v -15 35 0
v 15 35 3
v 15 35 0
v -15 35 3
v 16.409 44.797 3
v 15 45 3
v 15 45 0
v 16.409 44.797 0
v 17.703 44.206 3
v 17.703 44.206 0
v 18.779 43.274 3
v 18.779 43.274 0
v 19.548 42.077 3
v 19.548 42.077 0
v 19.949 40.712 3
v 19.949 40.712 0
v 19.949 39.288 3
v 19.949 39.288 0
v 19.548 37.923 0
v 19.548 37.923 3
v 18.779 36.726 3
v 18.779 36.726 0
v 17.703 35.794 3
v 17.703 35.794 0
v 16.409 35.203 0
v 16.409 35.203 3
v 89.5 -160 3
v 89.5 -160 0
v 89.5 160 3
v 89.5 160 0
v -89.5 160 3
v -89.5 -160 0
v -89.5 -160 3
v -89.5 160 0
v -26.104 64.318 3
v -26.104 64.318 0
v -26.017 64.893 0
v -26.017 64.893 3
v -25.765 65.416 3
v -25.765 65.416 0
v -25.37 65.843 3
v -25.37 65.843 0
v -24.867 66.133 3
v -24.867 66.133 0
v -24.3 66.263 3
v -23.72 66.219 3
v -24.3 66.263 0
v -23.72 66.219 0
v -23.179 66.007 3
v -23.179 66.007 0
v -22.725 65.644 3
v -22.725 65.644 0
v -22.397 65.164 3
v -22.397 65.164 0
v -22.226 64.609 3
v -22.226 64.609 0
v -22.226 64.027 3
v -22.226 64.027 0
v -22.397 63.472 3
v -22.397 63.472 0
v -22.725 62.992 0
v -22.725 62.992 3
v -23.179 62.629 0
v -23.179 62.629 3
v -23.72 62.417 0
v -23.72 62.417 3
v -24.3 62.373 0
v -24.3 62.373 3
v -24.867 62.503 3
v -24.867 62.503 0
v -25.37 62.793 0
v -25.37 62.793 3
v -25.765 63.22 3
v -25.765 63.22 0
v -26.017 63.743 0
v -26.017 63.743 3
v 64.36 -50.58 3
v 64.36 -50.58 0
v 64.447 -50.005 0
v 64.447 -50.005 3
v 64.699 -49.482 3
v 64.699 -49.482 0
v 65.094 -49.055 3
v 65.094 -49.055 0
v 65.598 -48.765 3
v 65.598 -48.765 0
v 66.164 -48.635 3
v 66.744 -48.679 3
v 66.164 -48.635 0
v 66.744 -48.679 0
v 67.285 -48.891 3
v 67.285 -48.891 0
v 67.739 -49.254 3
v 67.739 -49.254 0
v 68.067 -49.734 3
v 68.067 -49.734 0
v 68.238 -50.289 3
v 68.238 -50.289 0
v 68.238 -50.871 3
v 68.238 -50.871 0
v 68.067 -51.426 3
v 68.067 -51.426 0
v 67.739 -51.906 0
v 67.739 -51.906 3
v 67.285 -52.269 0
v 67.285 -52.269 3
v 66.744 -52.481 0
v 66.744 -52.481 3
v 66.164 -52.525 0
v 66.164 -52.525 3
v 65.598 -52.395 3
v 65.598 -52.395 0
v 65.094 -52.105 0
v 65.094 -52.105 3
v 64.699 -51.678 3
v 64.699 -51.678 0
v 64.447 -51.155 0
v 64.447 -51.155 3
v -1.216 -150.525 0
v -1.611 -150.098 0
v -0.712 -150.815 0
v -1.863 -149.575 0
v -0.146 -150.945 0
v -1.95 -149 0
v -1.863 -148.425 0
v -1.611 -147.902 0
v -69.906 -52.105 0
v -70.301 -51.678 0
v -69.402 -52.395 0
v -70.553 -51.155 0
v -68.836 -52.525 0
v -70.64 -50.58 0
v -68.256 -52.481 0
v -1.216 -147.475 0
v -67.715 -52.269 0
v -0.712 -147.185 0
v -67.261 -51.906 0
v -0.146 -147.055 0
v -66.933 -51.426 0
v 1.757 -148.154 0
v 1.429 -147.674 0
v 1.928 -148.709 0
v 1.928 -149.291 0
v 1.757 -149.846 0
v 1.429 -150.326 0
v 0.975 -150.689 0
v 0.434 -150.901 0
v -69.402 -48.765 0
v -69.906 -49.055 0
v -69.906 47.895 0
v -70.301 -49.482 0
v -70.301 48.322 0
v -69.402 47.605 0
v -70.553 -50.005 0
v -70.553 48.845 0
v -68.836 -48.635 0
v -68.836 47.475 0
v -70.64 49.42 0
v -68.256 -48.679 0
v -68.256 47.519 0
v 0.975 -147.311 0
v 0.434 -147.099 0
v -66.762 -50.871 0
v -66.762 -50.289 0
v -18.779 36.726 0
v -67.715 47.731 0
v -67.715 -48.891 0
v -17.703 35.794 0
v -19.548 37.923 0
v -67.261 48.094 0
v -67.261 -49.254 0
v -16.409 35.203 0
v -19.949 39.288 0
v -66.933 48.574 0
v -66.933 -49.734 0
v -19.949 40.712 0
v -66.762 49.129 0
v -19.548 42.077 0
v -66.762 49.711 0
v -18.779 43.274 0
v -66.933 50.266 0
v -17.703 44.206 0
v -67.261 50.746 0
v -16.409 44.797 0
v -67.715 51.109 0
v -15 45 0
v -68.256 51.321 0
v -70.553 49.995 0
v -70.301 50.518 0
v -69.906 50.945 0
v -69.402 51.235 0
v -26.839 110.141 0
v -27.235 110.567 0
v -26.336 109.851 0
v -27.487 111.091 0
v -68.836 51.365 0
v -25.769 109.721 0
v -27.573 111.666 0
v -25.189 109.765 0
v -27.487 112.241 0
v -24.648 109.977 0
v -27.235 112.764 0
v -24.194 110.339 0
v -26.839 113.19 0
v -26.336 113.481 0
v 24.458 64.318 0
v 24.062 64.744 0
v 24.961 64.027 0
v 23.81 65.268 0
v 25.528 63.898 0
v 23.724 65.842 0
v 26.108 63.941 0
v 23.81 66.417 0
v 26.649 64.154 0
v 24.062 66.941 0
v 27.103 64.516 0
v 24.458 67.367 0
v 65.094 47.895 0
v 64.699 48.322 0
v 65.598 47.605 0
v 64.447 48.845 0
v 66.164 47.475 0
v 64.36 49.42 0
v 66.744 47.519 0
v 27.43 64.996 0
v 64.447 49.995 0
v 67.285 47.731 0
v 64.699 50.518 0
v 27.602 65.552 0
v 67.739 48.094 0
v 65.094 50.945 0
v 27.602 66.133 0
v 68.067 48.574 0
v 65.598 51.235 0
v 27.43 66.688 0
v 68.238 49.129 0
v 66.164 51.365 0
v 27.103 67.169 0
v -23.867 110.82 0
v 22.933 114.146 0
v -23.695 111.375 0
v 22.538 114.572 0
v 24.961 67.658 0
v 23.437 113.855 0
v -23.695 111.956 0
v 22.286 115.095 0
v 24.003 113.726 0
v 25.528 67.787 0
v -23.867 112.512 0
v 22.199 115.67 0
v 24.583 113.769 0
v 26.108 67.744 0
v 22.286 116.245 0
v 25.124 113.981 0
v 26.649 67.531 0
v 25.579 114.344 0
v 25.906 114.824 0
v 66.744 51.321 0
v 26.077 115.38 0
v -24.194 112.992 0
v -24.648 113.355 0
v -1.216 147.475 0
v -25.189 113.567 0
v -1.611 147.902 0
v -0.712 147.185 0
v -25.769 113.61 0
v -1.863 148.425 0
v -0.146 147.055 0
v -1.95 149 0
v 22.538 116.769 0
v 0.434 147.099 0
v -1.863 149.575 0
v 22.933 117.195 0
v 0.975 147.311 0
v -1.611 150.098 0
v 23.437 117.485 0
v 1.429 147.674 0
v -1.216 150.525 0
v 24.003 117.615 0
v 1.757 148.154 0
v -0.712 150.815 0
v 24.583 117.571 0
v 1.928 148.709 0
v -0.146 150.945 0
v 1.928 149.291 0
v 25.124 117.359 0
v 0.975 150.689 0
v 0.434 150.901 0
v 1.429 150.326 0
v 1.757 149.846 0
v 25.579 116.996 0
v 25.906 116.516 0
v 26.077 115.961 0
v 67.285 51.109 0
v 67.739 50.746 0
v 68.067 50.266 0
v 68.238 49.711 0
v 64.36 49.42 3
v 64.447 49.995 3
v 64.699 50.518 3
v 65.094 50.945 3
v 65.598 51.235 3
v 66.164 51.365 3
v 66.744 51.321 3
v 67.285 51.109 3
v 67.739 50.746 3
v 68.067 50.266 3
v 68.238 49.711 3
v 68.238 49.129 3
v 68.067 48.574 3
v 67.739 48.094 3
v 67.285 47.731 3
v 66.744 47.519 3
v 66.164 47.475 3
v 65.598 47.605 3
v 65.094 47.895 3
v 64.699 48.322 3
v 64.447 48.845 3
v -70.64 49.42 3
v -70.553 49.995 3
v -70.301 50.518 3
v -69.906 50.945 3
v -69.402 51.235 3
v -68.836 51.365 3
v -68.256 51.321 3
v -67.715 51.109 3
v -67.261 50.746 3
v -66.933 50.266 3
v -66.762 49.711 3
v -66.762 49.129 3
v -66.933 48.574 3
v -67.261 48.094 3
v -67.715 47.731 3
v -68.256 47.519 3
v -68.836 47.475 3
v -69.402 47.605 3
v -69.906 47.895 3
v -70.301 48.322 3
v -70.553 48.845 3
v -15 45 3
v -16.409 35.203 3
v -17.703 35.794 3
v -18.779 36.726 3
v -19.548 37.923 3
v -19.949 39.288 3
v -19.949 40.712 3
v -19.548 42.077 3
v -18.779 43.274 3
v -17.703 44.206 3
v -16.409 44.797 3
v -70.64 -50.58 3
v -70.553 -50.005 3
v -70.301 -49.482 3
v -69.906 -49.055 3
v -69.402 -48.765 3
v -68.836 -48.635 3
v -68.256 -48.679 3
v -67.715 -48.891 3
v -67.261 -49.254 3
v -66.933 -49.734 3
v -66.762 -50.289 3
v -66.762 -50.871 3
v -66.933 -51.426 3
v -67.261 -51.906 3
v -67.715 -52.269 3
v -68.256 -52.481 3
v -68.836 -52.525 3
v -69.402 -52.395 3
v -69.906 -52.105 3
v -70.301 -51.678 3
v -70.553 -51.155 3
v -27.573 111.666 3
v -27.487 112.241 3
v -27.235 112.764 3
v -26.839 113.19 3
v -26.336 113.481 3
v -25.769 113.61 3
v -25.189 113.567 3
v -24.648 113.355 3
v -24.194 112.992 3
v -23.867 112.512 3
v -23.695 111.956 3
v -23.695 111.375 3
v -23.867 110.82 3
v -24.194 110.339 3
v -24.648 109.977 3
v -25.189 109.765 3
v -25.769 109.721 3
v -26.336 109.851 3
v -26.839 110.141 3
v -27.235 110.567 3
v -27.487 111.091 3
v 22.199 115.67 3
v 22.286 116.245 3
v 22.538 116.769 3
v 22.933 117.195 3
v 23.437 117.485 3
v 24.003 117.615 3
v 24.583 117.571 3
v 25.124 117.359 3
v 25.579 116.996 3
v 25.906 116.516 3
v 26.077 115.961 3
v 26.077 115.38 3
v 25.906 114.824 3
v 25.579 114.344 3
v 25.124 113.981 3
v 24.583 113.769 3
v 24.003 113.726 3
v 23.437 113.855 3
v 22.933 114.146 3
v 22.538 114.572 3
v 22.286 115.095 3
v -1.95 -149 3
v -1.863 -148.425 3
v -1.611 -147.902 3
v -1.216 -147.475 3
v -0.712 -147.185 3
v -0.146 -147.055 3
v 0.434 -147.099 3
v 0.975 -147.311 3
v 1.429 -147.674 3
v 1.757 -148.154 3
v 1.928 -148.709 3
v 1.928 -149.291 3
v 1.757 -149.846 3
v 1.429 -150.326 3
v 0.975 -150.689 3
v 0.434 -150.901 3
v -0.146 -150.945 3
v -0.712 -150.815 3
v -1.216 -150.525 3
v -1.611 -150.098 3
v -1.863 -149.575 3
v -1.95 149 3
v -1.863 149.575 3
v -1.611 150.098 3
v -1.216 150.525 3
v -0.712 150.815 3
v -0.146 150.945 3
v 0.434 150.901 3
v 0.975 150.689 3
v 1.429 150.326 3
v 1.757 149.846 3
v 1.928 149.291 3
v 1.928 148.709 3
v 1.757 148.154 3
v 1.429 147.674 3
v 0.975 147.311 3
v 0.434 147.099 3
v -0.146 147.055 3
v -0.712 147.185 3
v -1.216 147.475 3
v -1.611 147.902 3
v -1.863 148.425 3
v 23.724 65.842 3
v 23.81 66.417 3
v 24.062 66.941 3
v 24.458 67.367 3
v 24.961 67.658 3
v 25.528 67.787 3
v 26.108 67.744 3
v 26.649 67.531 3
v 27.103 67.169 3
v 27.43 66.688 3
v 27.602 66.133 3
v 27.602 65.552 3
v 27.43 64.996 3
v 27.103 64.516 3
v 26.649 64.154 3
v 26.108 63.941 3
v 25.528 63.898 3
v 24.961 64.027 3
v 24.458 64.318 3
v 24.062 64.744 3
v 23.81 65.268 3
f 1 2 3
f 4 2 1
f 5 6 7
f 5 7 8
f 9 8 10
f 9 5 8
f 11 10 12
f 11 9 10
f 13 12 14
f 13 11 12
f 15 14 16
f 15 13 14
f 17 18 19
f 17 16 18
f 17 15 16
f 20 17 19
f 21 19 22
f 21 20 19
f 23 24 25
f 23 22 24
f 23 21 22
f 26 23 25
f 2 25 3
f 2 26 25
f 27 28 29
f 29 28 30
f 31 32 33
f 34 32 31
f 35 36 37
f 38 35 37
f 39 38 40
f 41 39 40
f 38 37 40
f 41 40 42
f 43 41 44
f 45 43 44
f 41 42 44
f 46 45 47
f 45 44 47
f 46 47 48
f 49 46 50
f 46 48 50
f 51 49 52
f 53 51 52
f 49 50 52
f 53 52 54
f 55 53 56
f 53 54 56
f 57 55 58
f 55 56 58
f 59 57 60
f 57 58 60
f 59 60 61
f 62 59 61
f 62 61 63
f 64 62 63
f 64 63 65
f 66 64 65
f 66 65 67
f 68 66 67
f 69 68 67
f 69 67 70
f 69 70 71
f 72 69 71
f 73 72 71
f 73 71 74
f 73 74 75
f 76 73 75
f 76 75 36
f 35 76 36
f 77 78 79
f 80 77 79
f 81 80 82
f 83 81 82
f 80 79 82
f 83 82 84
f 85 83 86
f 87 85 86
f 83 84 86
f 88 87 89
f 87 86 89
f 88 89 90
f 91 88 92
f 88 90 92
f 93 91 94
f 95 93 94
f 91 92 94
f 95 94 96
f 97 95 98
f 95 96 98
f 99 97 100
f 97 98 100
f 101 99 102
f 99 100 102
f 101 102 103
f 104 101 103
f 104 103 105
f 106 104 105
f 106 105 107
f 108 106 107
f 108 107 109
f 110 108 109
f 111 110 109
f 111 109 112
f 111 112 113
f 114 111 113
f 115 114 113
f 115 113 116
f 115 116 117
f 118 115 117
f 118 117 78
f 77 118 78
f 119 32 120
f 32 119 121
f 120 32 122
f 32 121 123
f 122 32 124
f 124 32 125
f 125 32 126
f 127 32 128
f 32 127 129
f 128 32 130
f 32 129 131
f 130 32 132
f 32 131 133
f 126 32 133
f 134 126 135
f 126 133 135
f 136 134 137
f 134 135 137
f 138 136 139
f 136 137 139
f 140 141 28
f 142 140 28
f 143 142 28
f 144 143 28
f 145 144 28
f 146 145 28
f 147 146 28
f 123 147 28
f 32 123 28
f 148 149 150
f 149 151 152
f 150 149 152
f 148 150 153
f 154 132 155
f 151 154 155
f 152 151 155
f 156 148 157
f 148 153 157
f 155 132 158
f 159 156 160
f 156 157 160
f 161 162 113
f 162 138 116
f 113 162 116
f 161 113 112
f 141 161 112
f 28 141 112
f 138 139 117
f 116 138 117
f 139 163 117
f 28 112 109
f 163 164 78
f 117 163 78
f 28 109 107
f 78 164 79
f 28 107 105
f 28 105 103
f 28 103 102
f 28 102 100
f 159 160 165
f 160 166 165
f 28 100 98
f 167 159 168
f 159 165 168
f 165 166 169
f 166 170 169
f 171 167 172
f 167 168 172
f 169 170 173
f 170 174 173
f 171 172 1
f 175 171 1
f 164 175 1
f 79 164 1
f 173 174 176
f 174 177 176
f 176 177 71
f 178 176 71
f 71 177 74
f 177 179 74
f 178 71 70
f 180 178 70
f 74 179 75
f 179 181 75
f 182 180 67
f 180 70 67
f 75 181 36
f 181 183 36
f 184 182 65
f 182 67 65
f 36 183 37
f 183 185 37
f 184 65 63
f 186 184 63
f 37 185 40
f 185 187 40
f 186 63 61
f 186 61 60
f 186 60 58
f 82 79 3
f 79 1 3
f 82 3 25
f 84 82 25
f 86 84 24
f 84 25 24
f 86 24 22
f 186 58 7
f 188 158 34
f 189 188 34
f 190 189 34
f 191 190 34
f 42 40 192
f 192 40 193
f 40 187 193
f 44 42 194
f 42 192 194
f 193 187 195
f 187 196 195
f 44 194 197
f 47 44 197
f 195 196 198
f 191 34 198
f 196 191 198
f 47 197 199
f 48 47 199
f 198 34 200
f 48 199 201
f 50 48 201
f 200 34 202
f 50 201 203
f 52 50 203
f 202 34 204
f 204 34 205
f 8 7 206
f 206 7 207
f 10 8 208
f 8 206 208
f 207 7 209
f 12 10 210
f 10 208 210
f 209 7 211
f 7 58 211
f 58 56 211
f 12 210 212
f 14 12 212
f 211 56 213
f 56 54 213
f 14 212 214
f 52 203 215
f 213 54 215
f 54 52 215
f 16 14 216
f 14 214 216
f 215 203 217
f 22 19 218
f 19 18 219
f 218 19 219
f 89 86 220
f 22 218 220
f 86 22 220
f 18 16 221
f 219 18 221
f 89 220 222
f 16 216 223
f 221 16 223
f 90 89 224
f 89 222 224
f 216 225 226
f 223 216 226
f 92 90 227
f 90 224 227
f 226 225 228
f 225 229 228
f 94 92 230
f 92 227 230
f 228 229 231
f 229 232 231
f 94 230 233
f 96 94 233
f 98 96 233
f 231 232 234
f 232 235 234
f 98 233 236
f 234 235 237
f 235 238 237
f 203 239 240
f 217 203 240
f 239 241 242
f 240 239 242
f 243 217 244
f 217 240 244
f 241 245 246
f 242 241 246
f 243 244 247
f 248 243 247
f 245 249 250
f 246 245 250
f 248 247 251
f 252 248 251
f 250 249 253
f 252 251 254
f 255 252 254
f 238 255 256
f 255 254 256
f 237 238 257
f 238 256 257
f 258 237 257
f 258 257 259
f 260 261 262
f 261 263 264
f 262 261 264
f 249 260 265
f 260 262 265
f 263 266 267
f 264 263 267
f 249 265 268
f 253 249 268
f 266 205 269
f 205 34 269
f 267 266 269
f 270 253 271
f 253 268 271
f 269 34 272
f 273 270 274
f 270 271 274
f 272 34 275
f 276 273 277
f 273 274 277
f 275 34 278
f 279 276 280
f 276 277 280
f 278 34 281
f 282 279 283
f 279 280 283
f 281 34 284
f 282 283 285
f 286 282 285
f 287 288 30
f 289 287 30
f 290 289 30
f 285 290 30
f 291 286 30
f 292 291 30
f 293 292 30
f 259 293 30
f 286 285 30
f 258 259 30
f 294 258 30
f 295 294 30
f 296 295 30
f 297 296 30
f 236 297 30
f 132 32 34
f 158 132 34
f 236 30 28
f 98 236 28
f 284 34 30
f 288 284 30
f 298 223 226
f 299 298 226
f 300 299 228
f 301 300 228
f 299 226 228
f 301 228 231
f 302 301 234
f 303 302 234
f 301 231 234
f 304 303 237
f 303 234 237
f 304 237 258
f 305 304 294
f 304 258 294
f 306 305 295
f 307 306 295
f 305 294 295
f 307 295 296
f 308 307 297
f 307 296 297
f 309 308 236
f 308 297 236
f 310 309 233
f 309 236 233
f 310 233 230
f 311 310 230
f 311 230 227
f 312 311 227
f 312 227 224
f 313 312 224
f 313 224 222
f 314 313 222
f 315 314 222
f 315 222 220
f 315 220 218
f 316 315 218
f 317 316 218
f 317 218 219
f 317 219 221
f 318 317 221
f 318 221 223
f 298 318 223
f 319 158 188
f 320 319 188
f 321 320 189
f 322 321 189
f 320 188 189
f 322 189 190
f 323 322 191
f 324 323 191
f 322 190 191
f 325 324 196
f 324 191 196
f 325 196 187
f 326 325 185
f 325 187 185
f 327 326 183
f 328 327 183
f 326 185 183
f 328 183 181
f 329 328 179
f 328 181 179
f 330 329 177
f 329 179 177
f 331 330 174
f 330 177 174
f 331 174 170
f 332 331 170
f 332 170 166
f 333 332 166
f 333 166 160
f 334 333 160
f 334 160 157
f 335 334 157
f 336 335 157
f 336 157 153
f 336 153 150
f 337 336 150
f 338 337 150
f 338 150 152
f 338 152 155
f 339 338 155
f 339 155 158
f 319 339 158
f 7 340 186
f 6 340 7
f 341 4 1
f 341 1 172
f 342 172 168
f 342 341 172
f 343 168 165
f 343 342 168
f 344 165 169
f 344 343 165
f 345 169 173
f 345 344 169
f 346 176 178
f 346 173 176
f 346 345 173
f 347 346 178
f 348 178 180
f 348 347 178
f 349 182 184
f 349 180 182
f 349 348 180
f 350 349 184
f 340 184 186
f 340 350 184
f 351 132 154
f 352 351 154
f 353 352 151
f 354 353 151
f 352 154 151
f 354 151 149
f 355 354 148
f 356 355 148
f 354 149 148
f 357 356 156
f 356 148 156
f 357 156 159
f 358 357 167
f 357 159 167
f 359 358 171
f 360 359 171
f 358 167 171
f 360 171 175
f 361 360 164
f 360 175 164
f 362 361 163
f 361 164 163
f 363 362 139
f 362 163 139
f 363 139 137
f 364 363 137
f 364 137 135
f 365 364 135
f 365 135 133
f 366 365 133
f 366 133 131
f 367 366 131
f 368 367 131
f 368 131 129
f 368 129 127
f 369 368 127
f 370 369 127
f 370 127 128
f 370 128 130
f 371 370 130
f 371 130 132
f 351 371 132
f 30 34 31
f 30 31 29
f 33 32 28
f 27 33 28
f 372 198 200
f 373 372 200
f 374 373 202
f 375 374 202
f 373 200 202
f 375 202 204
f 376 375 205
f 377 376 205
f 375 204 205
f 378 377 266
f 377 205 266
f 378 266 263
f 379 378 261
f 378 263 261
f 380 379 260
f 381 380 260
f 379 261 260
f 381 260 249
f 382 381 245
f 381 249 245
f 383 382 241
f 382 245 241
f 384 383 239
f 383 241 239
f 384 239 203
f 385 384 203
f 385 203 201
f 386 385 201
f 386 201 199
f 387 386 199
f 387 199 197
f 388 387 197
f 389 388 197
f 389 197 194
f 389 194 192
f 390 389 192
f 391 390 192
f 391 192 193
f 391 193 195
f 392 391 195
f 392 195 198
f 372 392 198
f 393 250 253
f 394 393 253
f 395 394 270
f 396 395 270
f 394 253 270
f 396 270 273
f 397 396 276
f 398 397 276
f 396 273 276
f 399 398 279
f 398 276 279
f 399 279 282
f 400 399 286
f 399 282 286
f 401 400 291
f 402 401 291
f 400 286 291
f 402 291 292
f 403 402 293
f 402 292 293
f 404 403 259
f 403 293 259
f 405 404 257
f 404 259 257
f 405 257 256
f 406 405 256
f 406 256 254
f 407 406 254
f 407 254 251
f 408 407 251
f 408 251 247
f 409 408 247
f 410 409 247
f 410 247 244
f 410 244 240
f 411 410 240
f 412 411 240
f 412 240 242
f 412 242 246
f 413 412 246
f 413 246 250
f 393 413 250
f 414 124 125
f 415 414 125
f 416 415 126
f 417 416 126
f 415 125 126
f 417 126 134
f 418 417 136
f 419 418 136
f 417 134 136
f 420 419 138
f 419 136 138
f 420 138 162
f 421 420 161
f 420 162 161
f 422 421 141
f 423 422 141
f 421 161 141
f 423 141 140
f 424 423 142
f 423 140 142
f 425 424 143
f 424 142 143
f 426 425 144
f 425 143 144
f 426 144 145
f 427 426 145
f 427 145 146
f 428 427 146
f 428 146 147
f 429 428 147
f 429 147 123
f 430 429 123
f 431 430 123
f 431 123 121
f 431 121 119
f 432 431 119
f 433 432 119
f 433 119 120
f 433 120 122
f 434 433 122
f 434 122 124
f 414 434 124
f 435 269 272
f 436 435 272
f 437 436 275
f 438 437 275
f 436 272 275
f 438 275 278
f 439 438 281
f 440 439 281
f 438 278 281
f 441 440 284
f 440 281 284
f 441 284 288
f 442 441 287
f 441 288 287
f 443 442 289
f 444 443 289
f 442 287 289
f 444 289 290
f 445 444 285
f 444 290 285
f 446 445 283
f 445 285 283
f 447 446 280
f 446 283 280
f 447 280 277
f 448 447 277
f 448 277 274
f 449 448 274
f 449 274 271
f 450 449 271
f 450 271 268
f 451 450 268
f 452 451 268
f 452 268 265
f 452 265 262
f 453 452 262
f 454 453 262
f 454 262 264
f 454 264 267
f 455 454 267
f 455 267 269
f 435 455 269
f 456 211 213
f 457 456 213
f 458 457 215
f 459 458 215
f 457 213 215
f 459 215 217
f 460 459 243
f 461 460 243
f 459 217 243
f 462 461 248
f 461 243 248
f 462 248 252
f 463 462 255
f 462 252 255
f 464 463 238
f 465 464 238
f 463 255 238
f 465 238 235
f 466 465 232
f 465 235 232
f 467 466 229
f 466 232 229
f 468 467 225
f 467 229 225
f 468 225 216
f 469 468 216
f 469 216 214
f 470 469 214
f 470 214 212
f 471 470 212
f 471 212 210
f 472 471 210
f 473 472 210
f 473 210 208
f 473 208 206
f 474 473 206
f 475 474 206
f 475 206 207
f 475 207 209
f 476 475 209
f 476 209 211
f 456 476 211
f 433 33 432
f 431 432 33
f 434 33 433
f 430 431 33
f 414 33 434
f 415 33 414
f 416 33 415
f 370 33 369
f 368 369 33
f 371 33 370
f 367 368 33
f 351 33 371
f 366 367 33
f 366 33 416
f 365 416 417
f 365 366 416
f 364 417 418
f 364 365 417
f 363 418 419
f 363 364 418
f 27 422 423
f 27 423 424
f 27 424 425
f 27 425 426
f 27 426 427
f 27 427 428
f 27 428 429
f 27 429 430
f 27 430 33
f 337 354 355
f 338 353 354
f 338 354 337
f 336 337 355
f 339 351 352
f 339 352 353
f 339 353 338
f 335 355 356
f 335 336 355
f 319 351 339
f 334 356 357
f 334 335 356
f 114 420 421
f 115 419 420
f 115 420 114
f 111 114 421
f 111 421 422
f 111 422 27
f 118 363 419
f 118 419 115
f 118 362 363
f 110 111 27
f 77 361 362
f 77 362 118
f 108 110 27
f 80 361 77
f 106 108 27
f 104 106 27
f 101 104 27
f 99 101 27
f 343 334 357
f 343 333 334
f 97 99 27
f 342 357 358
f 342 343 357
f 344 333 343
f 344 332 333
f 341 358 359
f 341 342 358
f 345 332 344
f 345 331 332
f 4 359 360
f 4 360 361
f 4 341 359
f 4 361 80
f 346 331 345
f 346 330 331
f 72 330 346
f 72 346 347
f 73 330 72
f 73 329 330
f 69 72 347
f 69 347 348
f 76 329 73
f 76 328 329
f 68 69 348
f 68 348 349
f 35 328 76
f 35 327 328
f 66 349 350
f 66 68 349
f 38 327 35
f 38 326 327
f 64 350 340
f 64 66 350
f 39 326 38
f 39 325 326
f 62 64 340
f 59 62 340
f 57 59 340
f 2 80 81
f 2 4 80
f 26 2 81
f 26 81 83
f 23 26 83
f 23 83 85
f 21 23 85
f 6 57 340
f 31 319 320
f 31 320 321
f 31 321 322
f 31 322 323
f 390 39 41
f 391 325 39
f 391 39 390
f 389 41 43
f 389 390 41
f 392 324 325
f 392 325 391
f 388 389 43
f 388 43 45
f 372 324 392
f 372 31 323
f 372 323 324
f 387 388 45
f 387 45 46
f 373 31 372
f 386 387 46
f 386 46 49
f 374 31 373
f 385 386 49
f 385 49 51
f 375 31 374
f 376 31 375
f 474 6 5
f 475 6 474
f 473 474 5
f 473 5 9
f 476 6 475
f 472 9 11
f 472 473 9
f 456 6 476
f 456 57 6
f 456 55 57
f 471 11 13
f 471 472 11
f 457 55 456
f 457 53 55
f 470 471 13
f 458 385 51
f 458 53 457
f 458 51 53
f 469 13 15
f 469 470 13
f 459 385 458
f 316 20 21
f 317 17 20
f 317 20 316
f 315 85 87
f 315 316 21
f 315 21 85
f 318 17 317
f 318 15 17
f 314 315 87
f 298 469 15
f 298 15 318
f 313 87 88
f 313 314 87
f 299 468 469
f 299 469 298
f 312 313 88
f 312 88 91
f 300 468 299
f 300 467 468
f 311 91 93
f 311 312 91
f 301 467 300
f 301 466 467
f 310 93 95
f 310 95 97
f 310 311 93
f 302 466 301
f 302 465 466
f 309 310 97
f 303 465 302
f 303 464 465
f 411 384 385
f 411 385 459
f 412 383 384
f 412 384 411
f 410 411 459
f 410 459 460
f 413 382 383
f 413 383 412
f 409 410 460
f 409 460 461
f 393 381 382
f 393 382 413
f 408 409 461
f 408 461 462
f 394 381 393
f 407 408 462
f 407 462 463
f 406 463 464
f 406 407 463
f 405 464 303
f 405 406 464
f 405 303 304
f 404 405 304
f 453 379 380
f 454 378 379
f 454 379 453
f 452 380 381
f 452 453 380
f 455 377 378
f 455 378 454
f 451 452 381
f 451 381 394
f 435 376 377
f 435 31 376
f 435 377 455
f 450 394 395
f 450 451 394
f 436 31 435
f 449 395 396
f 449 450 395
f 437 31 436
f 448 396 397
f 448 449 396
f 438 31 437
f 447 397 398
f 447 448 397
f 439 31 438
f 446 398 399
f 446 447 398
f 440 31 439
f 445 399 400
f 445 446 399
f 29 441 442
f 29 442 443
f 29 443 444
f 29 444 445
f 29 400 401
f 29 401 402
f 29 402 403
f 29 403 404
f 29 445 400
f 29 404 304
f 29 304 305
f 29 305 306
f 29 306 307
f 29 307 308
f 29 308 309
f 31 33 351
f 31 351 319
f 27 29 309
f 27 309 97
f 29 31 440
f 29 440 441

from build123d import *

# Parameters (mm, degrees)
CROQUIS2_W                     = 179
CROQUIS2_H                     = 320
SALIENTE_EXTRUIR1_DEPTH        = 3
TALADRO_DE_MARGEN_PARA_M3_51_D = 3.9
CORTAR_EXTRUIR1_DEPTH          = 184.355528959
TALADRO_DE_MARGEN_PARA_M3_52_D = 3.9


with BuildPart() as part:
    # Croquis2 → Saliente-Extruir1 (new body)
    with BuildSketch(Plane.XY):
        Rectangle(CROQUIS2_W, CROQUIS2_H)
    extrude(amount=SALIENTE_EXTRUIR1_DEPTH)

    # Taladro de margen para M3.51 (through all)
    with Locations(Plane.XY.offset(3)):
        with Locations((0, 149), (-68.69, 49.42), (66.31, 49.42), (-68.69, -50.58), (0, -149), (66.31, -50.58)):
            Hole(TALADRO_DE_MARGEN_PARA_M3_51_D / 2)

    # robot arm bores → Cortar-Extruir1 (cut, through all)
    with BuildSketch(Plane.XY.offset(3)):
        with BuildLine():
            Line((-15, 45), (15, 45))
            ThreePointArc((15, 45), (20, 40), (15, 35))
            Line((15, 35), (-15, 35))
            ThreePointArc((-15, 35), (-20, 40), (-15, 45))
        make_face()
    extrude(amount=-CORTAR_EXTRUIR1_DEPTH, mode=Mode.SUBTRACT)

    # Taladro de margen para M3.52 (through all)
    with Locations(Plane.XY.offset(3)):
        with Locations((-24.154111306, 64.317986379), (25.673602741, 65.84242489), (24.14916423, 115.670138938), (-25.623407417, 111.66583138)):
            Hole(TALADRO_DE_MARGEN_PARA_M3_52_D / 2)


solid = part.part
